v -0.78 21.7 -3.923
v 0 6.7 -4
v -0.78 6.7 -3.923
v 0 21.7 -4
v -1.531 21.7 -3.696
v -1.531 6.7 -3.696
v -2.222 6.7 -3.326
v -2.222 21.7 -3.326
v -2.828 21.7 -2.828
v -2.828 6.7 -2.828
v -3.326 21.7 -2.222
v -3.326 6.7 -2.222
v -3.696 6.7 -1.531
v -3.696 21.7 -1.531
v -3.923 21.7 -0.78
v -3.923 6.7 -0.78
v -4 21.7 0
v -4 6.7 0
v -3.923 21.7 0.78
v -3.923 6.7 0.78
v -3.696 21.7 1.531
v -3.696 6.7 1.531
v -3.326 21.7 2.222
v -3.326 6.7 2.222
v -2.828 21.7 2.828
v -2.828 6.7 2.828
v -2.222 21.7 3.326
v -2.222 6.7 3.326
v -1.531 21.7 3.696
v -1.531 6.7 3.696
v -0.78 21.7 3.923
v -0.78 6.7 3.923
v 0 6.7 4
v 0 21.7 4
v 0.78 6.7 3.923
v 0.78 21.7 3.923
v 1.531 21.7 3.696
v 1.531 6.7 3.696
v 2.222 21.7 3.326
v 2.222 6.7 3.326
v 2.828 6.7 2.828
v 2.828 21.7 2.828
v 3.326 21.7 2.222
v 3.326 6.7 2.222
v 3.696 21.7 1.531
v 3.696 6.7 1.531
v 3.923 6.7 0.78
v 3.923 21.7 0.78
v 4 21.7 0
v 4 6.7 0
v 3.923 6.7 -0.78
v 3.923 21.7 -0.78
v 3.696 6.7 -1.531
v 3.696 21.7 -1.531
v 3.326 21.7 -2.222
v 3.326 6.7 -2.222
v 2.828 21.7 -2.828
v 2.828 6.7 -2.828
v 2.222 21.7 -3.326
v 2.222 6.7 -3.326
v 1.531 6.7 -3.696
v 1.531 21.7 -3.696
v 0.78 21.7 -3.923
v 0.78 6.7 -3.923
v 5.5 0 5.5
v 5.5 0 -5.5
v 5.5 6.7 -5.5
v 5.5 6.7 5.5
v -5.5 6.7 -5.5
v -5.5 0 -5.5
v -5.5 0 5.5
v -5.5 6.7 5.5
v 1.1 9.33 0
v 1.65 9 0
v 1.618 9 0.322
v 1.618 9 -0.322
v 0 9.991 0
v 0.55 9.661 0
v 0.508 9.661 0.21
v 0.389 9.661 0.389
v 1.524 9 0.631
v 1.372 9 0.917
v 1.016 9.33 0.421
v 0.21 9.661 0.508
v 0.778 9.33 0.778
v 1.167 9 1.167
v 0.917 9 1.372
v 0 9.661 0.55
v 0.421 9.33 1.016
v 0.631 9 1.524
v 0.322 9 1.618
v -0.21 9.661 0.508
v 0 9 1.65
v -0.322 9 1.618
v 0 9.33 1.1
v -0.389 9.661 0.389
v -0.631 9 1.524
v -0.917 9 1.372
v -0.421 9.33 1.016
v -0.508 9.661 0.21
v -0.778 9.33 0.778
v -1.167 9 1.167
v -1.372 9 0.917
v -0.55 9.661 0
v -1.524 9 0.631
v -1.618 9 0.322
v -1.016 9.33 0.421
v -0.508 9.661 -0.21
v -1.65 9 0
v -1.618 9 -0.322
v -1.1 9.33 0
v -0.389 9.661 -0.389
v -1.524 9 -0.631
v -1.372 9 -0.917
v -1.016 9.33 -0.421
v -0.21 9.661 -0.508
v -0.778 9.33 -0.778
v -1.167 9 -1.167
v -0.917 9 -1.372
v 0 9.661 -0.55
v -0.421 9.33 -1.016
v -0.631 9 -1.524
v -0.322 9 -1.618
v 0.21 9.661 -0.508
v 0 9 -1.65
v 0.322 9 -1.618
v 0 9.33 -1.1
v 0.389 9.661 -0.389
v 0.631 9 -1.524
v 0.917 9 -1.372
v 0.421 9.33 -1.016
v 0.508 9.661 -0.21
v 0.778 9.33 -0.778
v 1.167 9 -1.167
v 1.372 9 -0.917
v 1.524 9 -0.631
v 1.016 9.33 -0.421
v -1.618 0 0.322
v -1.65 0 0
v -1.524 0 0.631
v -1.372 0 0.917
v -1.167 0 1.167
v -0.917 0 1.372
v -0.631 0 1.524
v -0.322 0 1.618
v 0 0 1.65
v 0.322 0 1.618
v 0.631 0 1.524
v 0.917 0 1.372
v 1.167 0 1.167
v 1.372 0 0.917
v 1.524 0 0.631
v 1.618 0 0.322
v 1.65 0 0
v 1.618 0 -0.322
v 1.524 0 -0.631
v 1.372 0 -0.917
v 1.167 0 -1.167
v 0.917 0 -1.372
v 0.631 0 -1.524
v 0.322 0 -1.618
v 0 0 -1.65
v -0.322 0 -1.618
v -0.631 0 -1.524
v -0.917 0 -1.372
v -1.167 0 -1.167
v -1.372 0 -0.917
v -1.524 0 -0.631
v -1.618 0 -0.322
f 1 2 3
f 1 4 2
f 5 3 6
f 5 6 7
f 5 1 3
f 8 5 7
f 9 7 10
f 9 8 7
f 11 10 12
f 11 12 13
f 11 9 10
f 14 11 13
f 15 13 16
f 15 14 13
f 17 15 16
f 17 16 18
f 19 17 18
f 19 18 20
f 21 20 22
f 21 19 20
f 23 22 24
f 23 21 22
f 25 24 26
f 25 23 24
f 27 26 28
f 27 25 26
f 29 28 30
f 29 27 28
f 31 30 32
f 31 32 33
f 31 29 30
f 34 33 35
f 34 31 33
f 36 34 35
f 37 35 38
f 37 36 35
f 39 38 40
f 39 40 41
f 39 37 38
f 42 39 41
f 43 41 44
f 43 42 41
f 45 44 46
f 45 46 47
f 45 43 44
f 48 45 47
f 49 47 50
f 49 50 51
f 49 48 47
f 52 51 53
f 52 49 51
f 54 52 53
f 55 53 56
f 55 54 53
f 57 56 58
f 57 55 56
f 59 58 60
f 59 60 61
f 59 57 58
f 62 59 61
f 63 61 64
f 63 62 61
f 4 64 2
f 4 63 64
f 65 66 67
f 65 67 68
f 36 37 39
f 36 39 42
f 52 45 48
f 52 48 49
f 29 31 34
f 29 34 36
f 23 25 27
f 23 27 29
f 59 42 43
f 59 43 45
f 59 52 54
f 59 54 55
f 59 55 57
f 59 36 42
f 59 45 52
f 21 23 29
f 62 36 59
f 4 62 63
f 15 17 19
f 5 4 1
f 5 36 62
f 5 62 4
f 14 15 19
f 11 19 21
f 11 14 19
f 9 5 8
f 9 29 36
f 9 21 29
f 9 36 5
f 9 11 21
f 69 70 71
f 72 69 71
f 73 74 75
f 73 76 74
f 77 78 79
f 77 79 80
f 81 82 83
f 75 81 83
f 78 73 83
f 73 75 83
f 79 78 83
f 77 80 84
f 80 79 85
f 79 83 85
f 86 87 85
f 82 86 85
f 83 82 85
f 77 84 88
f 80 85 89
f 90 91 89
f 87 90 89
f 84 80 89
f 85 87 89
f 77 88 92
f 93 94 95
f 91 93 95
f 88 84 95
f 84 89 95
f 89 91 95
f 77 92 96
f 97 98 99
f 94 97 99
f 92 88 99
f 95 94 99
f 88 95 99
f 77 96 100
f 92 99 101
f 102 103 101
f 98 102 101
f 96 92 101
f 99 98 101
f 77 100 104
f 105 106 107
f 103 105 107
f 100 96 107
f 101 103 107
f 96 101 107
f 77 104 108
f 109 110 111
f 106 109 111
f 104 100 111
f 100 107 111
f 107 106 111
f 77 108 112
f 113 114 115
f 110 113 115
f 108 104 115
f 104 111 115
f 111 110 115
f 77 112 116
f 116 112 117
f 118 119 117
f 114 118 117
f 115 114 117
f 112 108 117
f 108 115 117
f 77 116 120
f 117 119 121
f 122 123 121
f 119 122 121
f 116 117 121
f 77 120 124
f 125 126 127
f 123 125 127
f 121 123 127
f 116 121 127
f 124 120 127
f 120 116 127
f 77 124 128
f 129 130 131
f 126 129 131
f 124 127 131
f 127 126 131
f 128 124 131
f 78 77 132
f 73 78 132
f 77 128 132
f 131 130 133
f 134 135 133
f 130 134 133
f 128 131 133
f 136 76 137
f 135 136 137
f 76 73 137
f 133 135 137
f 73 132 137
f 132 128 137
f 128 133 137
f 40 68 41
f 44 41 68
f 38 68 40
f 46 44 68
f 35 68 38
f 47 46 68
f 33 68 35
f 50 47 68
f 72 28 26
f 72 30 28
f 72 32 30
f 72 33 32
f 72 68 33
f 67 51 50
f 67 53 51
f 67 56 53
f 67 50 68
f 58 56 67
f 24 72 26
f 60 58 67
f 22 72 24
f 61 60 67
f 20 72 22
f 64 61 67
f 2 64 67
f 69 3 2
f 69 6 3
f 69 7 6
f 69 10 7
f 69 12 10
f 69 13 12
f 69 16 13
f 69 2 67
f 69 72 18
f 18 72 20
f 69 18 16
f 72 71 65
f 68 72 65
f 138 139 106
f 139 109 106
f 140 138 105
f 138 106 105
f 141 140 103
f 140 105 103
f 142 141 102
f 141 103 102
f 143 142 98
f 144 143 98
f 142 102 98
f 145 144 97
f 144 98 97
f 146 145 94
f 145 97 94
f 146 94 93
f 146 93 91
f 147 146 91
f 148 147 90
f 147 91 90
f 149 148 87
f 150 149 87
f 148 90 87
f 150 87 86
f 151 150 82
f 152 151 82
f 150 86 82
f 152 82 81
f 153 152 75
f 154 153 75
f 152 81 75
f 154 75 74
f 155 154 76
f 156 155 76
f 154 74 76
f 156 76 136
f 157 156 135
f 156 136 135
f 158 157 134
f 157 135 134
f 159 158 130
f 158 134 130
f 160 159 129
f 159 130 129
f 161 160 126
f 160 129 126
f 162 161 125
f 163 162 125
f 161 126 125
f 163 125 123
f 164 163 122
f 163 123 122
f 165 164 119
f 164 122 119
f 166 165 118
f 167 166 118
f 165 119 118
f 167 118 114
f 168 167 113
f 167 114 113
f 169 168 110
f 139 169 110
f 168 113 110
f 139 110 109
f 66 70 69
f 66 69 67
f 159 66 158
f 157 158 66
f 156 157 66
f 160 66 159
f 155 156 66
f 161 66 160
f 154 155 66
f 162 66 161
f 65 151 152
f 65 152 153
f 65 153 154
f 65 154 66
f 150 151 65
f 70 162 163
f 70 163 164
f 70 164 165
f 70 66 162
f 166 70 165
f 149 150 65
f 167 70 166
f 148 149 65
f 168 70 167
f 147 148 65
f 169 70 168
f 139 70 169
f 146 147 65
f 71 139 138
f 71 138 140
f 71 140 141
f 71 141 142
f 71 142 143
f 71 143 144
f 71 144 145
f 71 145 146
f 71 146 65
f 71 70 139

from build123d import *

# Parameters (mm, degrees)
ESQUISSE2_OUTSIDE_W     = 24.27
ESQUISSE2_OUTSIDE_H     = 24.27
ESQUISSE2_OUTSIDE_W_2   = 11
ESQUISSE2_OUTSIDE_H_2   = 11
ENL_V_MAT_EXTRU_1_DEPTH = 25.472229159
TROU_TARAUD_M41_D       = 3.3
TROU_TARAUD_M41_DEPTH   = 9
TROU_TARAUD_M41_TIP     = 0.991420021


with BuildPart() as part:
    # Esquisse1 → Révolution1 (revolve)
    with BuildSketch(Plane.XY, mode=Mode.PRIVATE) as r_volution1_sk:
        Polygon((0, 0), (8, 0), (8, 6.7), (4, 6.7), (4, 21.7), (0, 21.7), align=None)
    revolve(r_volution1_sk.sketch.rotate(Axis((0, 0, 0), (0, 1, 0)), 90), axis=Axis((0, 0, 0), (0, 1, 0)))

    # Esquisse2 outside → Enlèv. mat.-Extru.1 (cut, through all)
    with BuildSketch(Plane.XZ):
        Rectangle(ESQUISSE2_OUTSIDE_W, ESQUISSE2_OUTSIDE_H)
        Rectangle(ESQUISSE2_OUTSIDE_W_2, ESQUISSE2_OUTSIDE_H_2, mode=Mode.SUBTRACT)
    extrude(amount=-ENL_V_MAT_EXTRU_1_DEPTH, mode=Mode.SUBTRACT)

    # Trou taraudé M41
    with Locations(Plane.XZ):
        with Locations((0, 0)):
            Hole(TROU_TARAUD_M41_D / 2, depth=TROU_TARAUD_M41_DEPTH)
            with Locations((0, 0, -(TROU_TARAUD_M41_DEPTH + TROU_TARAUD_M41_TIP / 2))):  # 118° drill point
                Cone(0, TROU_TARAUD_M41_D / 2, TROU_TARAUD_M41_TIP, mode=Mode.SUBTRACT)


solid = part.part
